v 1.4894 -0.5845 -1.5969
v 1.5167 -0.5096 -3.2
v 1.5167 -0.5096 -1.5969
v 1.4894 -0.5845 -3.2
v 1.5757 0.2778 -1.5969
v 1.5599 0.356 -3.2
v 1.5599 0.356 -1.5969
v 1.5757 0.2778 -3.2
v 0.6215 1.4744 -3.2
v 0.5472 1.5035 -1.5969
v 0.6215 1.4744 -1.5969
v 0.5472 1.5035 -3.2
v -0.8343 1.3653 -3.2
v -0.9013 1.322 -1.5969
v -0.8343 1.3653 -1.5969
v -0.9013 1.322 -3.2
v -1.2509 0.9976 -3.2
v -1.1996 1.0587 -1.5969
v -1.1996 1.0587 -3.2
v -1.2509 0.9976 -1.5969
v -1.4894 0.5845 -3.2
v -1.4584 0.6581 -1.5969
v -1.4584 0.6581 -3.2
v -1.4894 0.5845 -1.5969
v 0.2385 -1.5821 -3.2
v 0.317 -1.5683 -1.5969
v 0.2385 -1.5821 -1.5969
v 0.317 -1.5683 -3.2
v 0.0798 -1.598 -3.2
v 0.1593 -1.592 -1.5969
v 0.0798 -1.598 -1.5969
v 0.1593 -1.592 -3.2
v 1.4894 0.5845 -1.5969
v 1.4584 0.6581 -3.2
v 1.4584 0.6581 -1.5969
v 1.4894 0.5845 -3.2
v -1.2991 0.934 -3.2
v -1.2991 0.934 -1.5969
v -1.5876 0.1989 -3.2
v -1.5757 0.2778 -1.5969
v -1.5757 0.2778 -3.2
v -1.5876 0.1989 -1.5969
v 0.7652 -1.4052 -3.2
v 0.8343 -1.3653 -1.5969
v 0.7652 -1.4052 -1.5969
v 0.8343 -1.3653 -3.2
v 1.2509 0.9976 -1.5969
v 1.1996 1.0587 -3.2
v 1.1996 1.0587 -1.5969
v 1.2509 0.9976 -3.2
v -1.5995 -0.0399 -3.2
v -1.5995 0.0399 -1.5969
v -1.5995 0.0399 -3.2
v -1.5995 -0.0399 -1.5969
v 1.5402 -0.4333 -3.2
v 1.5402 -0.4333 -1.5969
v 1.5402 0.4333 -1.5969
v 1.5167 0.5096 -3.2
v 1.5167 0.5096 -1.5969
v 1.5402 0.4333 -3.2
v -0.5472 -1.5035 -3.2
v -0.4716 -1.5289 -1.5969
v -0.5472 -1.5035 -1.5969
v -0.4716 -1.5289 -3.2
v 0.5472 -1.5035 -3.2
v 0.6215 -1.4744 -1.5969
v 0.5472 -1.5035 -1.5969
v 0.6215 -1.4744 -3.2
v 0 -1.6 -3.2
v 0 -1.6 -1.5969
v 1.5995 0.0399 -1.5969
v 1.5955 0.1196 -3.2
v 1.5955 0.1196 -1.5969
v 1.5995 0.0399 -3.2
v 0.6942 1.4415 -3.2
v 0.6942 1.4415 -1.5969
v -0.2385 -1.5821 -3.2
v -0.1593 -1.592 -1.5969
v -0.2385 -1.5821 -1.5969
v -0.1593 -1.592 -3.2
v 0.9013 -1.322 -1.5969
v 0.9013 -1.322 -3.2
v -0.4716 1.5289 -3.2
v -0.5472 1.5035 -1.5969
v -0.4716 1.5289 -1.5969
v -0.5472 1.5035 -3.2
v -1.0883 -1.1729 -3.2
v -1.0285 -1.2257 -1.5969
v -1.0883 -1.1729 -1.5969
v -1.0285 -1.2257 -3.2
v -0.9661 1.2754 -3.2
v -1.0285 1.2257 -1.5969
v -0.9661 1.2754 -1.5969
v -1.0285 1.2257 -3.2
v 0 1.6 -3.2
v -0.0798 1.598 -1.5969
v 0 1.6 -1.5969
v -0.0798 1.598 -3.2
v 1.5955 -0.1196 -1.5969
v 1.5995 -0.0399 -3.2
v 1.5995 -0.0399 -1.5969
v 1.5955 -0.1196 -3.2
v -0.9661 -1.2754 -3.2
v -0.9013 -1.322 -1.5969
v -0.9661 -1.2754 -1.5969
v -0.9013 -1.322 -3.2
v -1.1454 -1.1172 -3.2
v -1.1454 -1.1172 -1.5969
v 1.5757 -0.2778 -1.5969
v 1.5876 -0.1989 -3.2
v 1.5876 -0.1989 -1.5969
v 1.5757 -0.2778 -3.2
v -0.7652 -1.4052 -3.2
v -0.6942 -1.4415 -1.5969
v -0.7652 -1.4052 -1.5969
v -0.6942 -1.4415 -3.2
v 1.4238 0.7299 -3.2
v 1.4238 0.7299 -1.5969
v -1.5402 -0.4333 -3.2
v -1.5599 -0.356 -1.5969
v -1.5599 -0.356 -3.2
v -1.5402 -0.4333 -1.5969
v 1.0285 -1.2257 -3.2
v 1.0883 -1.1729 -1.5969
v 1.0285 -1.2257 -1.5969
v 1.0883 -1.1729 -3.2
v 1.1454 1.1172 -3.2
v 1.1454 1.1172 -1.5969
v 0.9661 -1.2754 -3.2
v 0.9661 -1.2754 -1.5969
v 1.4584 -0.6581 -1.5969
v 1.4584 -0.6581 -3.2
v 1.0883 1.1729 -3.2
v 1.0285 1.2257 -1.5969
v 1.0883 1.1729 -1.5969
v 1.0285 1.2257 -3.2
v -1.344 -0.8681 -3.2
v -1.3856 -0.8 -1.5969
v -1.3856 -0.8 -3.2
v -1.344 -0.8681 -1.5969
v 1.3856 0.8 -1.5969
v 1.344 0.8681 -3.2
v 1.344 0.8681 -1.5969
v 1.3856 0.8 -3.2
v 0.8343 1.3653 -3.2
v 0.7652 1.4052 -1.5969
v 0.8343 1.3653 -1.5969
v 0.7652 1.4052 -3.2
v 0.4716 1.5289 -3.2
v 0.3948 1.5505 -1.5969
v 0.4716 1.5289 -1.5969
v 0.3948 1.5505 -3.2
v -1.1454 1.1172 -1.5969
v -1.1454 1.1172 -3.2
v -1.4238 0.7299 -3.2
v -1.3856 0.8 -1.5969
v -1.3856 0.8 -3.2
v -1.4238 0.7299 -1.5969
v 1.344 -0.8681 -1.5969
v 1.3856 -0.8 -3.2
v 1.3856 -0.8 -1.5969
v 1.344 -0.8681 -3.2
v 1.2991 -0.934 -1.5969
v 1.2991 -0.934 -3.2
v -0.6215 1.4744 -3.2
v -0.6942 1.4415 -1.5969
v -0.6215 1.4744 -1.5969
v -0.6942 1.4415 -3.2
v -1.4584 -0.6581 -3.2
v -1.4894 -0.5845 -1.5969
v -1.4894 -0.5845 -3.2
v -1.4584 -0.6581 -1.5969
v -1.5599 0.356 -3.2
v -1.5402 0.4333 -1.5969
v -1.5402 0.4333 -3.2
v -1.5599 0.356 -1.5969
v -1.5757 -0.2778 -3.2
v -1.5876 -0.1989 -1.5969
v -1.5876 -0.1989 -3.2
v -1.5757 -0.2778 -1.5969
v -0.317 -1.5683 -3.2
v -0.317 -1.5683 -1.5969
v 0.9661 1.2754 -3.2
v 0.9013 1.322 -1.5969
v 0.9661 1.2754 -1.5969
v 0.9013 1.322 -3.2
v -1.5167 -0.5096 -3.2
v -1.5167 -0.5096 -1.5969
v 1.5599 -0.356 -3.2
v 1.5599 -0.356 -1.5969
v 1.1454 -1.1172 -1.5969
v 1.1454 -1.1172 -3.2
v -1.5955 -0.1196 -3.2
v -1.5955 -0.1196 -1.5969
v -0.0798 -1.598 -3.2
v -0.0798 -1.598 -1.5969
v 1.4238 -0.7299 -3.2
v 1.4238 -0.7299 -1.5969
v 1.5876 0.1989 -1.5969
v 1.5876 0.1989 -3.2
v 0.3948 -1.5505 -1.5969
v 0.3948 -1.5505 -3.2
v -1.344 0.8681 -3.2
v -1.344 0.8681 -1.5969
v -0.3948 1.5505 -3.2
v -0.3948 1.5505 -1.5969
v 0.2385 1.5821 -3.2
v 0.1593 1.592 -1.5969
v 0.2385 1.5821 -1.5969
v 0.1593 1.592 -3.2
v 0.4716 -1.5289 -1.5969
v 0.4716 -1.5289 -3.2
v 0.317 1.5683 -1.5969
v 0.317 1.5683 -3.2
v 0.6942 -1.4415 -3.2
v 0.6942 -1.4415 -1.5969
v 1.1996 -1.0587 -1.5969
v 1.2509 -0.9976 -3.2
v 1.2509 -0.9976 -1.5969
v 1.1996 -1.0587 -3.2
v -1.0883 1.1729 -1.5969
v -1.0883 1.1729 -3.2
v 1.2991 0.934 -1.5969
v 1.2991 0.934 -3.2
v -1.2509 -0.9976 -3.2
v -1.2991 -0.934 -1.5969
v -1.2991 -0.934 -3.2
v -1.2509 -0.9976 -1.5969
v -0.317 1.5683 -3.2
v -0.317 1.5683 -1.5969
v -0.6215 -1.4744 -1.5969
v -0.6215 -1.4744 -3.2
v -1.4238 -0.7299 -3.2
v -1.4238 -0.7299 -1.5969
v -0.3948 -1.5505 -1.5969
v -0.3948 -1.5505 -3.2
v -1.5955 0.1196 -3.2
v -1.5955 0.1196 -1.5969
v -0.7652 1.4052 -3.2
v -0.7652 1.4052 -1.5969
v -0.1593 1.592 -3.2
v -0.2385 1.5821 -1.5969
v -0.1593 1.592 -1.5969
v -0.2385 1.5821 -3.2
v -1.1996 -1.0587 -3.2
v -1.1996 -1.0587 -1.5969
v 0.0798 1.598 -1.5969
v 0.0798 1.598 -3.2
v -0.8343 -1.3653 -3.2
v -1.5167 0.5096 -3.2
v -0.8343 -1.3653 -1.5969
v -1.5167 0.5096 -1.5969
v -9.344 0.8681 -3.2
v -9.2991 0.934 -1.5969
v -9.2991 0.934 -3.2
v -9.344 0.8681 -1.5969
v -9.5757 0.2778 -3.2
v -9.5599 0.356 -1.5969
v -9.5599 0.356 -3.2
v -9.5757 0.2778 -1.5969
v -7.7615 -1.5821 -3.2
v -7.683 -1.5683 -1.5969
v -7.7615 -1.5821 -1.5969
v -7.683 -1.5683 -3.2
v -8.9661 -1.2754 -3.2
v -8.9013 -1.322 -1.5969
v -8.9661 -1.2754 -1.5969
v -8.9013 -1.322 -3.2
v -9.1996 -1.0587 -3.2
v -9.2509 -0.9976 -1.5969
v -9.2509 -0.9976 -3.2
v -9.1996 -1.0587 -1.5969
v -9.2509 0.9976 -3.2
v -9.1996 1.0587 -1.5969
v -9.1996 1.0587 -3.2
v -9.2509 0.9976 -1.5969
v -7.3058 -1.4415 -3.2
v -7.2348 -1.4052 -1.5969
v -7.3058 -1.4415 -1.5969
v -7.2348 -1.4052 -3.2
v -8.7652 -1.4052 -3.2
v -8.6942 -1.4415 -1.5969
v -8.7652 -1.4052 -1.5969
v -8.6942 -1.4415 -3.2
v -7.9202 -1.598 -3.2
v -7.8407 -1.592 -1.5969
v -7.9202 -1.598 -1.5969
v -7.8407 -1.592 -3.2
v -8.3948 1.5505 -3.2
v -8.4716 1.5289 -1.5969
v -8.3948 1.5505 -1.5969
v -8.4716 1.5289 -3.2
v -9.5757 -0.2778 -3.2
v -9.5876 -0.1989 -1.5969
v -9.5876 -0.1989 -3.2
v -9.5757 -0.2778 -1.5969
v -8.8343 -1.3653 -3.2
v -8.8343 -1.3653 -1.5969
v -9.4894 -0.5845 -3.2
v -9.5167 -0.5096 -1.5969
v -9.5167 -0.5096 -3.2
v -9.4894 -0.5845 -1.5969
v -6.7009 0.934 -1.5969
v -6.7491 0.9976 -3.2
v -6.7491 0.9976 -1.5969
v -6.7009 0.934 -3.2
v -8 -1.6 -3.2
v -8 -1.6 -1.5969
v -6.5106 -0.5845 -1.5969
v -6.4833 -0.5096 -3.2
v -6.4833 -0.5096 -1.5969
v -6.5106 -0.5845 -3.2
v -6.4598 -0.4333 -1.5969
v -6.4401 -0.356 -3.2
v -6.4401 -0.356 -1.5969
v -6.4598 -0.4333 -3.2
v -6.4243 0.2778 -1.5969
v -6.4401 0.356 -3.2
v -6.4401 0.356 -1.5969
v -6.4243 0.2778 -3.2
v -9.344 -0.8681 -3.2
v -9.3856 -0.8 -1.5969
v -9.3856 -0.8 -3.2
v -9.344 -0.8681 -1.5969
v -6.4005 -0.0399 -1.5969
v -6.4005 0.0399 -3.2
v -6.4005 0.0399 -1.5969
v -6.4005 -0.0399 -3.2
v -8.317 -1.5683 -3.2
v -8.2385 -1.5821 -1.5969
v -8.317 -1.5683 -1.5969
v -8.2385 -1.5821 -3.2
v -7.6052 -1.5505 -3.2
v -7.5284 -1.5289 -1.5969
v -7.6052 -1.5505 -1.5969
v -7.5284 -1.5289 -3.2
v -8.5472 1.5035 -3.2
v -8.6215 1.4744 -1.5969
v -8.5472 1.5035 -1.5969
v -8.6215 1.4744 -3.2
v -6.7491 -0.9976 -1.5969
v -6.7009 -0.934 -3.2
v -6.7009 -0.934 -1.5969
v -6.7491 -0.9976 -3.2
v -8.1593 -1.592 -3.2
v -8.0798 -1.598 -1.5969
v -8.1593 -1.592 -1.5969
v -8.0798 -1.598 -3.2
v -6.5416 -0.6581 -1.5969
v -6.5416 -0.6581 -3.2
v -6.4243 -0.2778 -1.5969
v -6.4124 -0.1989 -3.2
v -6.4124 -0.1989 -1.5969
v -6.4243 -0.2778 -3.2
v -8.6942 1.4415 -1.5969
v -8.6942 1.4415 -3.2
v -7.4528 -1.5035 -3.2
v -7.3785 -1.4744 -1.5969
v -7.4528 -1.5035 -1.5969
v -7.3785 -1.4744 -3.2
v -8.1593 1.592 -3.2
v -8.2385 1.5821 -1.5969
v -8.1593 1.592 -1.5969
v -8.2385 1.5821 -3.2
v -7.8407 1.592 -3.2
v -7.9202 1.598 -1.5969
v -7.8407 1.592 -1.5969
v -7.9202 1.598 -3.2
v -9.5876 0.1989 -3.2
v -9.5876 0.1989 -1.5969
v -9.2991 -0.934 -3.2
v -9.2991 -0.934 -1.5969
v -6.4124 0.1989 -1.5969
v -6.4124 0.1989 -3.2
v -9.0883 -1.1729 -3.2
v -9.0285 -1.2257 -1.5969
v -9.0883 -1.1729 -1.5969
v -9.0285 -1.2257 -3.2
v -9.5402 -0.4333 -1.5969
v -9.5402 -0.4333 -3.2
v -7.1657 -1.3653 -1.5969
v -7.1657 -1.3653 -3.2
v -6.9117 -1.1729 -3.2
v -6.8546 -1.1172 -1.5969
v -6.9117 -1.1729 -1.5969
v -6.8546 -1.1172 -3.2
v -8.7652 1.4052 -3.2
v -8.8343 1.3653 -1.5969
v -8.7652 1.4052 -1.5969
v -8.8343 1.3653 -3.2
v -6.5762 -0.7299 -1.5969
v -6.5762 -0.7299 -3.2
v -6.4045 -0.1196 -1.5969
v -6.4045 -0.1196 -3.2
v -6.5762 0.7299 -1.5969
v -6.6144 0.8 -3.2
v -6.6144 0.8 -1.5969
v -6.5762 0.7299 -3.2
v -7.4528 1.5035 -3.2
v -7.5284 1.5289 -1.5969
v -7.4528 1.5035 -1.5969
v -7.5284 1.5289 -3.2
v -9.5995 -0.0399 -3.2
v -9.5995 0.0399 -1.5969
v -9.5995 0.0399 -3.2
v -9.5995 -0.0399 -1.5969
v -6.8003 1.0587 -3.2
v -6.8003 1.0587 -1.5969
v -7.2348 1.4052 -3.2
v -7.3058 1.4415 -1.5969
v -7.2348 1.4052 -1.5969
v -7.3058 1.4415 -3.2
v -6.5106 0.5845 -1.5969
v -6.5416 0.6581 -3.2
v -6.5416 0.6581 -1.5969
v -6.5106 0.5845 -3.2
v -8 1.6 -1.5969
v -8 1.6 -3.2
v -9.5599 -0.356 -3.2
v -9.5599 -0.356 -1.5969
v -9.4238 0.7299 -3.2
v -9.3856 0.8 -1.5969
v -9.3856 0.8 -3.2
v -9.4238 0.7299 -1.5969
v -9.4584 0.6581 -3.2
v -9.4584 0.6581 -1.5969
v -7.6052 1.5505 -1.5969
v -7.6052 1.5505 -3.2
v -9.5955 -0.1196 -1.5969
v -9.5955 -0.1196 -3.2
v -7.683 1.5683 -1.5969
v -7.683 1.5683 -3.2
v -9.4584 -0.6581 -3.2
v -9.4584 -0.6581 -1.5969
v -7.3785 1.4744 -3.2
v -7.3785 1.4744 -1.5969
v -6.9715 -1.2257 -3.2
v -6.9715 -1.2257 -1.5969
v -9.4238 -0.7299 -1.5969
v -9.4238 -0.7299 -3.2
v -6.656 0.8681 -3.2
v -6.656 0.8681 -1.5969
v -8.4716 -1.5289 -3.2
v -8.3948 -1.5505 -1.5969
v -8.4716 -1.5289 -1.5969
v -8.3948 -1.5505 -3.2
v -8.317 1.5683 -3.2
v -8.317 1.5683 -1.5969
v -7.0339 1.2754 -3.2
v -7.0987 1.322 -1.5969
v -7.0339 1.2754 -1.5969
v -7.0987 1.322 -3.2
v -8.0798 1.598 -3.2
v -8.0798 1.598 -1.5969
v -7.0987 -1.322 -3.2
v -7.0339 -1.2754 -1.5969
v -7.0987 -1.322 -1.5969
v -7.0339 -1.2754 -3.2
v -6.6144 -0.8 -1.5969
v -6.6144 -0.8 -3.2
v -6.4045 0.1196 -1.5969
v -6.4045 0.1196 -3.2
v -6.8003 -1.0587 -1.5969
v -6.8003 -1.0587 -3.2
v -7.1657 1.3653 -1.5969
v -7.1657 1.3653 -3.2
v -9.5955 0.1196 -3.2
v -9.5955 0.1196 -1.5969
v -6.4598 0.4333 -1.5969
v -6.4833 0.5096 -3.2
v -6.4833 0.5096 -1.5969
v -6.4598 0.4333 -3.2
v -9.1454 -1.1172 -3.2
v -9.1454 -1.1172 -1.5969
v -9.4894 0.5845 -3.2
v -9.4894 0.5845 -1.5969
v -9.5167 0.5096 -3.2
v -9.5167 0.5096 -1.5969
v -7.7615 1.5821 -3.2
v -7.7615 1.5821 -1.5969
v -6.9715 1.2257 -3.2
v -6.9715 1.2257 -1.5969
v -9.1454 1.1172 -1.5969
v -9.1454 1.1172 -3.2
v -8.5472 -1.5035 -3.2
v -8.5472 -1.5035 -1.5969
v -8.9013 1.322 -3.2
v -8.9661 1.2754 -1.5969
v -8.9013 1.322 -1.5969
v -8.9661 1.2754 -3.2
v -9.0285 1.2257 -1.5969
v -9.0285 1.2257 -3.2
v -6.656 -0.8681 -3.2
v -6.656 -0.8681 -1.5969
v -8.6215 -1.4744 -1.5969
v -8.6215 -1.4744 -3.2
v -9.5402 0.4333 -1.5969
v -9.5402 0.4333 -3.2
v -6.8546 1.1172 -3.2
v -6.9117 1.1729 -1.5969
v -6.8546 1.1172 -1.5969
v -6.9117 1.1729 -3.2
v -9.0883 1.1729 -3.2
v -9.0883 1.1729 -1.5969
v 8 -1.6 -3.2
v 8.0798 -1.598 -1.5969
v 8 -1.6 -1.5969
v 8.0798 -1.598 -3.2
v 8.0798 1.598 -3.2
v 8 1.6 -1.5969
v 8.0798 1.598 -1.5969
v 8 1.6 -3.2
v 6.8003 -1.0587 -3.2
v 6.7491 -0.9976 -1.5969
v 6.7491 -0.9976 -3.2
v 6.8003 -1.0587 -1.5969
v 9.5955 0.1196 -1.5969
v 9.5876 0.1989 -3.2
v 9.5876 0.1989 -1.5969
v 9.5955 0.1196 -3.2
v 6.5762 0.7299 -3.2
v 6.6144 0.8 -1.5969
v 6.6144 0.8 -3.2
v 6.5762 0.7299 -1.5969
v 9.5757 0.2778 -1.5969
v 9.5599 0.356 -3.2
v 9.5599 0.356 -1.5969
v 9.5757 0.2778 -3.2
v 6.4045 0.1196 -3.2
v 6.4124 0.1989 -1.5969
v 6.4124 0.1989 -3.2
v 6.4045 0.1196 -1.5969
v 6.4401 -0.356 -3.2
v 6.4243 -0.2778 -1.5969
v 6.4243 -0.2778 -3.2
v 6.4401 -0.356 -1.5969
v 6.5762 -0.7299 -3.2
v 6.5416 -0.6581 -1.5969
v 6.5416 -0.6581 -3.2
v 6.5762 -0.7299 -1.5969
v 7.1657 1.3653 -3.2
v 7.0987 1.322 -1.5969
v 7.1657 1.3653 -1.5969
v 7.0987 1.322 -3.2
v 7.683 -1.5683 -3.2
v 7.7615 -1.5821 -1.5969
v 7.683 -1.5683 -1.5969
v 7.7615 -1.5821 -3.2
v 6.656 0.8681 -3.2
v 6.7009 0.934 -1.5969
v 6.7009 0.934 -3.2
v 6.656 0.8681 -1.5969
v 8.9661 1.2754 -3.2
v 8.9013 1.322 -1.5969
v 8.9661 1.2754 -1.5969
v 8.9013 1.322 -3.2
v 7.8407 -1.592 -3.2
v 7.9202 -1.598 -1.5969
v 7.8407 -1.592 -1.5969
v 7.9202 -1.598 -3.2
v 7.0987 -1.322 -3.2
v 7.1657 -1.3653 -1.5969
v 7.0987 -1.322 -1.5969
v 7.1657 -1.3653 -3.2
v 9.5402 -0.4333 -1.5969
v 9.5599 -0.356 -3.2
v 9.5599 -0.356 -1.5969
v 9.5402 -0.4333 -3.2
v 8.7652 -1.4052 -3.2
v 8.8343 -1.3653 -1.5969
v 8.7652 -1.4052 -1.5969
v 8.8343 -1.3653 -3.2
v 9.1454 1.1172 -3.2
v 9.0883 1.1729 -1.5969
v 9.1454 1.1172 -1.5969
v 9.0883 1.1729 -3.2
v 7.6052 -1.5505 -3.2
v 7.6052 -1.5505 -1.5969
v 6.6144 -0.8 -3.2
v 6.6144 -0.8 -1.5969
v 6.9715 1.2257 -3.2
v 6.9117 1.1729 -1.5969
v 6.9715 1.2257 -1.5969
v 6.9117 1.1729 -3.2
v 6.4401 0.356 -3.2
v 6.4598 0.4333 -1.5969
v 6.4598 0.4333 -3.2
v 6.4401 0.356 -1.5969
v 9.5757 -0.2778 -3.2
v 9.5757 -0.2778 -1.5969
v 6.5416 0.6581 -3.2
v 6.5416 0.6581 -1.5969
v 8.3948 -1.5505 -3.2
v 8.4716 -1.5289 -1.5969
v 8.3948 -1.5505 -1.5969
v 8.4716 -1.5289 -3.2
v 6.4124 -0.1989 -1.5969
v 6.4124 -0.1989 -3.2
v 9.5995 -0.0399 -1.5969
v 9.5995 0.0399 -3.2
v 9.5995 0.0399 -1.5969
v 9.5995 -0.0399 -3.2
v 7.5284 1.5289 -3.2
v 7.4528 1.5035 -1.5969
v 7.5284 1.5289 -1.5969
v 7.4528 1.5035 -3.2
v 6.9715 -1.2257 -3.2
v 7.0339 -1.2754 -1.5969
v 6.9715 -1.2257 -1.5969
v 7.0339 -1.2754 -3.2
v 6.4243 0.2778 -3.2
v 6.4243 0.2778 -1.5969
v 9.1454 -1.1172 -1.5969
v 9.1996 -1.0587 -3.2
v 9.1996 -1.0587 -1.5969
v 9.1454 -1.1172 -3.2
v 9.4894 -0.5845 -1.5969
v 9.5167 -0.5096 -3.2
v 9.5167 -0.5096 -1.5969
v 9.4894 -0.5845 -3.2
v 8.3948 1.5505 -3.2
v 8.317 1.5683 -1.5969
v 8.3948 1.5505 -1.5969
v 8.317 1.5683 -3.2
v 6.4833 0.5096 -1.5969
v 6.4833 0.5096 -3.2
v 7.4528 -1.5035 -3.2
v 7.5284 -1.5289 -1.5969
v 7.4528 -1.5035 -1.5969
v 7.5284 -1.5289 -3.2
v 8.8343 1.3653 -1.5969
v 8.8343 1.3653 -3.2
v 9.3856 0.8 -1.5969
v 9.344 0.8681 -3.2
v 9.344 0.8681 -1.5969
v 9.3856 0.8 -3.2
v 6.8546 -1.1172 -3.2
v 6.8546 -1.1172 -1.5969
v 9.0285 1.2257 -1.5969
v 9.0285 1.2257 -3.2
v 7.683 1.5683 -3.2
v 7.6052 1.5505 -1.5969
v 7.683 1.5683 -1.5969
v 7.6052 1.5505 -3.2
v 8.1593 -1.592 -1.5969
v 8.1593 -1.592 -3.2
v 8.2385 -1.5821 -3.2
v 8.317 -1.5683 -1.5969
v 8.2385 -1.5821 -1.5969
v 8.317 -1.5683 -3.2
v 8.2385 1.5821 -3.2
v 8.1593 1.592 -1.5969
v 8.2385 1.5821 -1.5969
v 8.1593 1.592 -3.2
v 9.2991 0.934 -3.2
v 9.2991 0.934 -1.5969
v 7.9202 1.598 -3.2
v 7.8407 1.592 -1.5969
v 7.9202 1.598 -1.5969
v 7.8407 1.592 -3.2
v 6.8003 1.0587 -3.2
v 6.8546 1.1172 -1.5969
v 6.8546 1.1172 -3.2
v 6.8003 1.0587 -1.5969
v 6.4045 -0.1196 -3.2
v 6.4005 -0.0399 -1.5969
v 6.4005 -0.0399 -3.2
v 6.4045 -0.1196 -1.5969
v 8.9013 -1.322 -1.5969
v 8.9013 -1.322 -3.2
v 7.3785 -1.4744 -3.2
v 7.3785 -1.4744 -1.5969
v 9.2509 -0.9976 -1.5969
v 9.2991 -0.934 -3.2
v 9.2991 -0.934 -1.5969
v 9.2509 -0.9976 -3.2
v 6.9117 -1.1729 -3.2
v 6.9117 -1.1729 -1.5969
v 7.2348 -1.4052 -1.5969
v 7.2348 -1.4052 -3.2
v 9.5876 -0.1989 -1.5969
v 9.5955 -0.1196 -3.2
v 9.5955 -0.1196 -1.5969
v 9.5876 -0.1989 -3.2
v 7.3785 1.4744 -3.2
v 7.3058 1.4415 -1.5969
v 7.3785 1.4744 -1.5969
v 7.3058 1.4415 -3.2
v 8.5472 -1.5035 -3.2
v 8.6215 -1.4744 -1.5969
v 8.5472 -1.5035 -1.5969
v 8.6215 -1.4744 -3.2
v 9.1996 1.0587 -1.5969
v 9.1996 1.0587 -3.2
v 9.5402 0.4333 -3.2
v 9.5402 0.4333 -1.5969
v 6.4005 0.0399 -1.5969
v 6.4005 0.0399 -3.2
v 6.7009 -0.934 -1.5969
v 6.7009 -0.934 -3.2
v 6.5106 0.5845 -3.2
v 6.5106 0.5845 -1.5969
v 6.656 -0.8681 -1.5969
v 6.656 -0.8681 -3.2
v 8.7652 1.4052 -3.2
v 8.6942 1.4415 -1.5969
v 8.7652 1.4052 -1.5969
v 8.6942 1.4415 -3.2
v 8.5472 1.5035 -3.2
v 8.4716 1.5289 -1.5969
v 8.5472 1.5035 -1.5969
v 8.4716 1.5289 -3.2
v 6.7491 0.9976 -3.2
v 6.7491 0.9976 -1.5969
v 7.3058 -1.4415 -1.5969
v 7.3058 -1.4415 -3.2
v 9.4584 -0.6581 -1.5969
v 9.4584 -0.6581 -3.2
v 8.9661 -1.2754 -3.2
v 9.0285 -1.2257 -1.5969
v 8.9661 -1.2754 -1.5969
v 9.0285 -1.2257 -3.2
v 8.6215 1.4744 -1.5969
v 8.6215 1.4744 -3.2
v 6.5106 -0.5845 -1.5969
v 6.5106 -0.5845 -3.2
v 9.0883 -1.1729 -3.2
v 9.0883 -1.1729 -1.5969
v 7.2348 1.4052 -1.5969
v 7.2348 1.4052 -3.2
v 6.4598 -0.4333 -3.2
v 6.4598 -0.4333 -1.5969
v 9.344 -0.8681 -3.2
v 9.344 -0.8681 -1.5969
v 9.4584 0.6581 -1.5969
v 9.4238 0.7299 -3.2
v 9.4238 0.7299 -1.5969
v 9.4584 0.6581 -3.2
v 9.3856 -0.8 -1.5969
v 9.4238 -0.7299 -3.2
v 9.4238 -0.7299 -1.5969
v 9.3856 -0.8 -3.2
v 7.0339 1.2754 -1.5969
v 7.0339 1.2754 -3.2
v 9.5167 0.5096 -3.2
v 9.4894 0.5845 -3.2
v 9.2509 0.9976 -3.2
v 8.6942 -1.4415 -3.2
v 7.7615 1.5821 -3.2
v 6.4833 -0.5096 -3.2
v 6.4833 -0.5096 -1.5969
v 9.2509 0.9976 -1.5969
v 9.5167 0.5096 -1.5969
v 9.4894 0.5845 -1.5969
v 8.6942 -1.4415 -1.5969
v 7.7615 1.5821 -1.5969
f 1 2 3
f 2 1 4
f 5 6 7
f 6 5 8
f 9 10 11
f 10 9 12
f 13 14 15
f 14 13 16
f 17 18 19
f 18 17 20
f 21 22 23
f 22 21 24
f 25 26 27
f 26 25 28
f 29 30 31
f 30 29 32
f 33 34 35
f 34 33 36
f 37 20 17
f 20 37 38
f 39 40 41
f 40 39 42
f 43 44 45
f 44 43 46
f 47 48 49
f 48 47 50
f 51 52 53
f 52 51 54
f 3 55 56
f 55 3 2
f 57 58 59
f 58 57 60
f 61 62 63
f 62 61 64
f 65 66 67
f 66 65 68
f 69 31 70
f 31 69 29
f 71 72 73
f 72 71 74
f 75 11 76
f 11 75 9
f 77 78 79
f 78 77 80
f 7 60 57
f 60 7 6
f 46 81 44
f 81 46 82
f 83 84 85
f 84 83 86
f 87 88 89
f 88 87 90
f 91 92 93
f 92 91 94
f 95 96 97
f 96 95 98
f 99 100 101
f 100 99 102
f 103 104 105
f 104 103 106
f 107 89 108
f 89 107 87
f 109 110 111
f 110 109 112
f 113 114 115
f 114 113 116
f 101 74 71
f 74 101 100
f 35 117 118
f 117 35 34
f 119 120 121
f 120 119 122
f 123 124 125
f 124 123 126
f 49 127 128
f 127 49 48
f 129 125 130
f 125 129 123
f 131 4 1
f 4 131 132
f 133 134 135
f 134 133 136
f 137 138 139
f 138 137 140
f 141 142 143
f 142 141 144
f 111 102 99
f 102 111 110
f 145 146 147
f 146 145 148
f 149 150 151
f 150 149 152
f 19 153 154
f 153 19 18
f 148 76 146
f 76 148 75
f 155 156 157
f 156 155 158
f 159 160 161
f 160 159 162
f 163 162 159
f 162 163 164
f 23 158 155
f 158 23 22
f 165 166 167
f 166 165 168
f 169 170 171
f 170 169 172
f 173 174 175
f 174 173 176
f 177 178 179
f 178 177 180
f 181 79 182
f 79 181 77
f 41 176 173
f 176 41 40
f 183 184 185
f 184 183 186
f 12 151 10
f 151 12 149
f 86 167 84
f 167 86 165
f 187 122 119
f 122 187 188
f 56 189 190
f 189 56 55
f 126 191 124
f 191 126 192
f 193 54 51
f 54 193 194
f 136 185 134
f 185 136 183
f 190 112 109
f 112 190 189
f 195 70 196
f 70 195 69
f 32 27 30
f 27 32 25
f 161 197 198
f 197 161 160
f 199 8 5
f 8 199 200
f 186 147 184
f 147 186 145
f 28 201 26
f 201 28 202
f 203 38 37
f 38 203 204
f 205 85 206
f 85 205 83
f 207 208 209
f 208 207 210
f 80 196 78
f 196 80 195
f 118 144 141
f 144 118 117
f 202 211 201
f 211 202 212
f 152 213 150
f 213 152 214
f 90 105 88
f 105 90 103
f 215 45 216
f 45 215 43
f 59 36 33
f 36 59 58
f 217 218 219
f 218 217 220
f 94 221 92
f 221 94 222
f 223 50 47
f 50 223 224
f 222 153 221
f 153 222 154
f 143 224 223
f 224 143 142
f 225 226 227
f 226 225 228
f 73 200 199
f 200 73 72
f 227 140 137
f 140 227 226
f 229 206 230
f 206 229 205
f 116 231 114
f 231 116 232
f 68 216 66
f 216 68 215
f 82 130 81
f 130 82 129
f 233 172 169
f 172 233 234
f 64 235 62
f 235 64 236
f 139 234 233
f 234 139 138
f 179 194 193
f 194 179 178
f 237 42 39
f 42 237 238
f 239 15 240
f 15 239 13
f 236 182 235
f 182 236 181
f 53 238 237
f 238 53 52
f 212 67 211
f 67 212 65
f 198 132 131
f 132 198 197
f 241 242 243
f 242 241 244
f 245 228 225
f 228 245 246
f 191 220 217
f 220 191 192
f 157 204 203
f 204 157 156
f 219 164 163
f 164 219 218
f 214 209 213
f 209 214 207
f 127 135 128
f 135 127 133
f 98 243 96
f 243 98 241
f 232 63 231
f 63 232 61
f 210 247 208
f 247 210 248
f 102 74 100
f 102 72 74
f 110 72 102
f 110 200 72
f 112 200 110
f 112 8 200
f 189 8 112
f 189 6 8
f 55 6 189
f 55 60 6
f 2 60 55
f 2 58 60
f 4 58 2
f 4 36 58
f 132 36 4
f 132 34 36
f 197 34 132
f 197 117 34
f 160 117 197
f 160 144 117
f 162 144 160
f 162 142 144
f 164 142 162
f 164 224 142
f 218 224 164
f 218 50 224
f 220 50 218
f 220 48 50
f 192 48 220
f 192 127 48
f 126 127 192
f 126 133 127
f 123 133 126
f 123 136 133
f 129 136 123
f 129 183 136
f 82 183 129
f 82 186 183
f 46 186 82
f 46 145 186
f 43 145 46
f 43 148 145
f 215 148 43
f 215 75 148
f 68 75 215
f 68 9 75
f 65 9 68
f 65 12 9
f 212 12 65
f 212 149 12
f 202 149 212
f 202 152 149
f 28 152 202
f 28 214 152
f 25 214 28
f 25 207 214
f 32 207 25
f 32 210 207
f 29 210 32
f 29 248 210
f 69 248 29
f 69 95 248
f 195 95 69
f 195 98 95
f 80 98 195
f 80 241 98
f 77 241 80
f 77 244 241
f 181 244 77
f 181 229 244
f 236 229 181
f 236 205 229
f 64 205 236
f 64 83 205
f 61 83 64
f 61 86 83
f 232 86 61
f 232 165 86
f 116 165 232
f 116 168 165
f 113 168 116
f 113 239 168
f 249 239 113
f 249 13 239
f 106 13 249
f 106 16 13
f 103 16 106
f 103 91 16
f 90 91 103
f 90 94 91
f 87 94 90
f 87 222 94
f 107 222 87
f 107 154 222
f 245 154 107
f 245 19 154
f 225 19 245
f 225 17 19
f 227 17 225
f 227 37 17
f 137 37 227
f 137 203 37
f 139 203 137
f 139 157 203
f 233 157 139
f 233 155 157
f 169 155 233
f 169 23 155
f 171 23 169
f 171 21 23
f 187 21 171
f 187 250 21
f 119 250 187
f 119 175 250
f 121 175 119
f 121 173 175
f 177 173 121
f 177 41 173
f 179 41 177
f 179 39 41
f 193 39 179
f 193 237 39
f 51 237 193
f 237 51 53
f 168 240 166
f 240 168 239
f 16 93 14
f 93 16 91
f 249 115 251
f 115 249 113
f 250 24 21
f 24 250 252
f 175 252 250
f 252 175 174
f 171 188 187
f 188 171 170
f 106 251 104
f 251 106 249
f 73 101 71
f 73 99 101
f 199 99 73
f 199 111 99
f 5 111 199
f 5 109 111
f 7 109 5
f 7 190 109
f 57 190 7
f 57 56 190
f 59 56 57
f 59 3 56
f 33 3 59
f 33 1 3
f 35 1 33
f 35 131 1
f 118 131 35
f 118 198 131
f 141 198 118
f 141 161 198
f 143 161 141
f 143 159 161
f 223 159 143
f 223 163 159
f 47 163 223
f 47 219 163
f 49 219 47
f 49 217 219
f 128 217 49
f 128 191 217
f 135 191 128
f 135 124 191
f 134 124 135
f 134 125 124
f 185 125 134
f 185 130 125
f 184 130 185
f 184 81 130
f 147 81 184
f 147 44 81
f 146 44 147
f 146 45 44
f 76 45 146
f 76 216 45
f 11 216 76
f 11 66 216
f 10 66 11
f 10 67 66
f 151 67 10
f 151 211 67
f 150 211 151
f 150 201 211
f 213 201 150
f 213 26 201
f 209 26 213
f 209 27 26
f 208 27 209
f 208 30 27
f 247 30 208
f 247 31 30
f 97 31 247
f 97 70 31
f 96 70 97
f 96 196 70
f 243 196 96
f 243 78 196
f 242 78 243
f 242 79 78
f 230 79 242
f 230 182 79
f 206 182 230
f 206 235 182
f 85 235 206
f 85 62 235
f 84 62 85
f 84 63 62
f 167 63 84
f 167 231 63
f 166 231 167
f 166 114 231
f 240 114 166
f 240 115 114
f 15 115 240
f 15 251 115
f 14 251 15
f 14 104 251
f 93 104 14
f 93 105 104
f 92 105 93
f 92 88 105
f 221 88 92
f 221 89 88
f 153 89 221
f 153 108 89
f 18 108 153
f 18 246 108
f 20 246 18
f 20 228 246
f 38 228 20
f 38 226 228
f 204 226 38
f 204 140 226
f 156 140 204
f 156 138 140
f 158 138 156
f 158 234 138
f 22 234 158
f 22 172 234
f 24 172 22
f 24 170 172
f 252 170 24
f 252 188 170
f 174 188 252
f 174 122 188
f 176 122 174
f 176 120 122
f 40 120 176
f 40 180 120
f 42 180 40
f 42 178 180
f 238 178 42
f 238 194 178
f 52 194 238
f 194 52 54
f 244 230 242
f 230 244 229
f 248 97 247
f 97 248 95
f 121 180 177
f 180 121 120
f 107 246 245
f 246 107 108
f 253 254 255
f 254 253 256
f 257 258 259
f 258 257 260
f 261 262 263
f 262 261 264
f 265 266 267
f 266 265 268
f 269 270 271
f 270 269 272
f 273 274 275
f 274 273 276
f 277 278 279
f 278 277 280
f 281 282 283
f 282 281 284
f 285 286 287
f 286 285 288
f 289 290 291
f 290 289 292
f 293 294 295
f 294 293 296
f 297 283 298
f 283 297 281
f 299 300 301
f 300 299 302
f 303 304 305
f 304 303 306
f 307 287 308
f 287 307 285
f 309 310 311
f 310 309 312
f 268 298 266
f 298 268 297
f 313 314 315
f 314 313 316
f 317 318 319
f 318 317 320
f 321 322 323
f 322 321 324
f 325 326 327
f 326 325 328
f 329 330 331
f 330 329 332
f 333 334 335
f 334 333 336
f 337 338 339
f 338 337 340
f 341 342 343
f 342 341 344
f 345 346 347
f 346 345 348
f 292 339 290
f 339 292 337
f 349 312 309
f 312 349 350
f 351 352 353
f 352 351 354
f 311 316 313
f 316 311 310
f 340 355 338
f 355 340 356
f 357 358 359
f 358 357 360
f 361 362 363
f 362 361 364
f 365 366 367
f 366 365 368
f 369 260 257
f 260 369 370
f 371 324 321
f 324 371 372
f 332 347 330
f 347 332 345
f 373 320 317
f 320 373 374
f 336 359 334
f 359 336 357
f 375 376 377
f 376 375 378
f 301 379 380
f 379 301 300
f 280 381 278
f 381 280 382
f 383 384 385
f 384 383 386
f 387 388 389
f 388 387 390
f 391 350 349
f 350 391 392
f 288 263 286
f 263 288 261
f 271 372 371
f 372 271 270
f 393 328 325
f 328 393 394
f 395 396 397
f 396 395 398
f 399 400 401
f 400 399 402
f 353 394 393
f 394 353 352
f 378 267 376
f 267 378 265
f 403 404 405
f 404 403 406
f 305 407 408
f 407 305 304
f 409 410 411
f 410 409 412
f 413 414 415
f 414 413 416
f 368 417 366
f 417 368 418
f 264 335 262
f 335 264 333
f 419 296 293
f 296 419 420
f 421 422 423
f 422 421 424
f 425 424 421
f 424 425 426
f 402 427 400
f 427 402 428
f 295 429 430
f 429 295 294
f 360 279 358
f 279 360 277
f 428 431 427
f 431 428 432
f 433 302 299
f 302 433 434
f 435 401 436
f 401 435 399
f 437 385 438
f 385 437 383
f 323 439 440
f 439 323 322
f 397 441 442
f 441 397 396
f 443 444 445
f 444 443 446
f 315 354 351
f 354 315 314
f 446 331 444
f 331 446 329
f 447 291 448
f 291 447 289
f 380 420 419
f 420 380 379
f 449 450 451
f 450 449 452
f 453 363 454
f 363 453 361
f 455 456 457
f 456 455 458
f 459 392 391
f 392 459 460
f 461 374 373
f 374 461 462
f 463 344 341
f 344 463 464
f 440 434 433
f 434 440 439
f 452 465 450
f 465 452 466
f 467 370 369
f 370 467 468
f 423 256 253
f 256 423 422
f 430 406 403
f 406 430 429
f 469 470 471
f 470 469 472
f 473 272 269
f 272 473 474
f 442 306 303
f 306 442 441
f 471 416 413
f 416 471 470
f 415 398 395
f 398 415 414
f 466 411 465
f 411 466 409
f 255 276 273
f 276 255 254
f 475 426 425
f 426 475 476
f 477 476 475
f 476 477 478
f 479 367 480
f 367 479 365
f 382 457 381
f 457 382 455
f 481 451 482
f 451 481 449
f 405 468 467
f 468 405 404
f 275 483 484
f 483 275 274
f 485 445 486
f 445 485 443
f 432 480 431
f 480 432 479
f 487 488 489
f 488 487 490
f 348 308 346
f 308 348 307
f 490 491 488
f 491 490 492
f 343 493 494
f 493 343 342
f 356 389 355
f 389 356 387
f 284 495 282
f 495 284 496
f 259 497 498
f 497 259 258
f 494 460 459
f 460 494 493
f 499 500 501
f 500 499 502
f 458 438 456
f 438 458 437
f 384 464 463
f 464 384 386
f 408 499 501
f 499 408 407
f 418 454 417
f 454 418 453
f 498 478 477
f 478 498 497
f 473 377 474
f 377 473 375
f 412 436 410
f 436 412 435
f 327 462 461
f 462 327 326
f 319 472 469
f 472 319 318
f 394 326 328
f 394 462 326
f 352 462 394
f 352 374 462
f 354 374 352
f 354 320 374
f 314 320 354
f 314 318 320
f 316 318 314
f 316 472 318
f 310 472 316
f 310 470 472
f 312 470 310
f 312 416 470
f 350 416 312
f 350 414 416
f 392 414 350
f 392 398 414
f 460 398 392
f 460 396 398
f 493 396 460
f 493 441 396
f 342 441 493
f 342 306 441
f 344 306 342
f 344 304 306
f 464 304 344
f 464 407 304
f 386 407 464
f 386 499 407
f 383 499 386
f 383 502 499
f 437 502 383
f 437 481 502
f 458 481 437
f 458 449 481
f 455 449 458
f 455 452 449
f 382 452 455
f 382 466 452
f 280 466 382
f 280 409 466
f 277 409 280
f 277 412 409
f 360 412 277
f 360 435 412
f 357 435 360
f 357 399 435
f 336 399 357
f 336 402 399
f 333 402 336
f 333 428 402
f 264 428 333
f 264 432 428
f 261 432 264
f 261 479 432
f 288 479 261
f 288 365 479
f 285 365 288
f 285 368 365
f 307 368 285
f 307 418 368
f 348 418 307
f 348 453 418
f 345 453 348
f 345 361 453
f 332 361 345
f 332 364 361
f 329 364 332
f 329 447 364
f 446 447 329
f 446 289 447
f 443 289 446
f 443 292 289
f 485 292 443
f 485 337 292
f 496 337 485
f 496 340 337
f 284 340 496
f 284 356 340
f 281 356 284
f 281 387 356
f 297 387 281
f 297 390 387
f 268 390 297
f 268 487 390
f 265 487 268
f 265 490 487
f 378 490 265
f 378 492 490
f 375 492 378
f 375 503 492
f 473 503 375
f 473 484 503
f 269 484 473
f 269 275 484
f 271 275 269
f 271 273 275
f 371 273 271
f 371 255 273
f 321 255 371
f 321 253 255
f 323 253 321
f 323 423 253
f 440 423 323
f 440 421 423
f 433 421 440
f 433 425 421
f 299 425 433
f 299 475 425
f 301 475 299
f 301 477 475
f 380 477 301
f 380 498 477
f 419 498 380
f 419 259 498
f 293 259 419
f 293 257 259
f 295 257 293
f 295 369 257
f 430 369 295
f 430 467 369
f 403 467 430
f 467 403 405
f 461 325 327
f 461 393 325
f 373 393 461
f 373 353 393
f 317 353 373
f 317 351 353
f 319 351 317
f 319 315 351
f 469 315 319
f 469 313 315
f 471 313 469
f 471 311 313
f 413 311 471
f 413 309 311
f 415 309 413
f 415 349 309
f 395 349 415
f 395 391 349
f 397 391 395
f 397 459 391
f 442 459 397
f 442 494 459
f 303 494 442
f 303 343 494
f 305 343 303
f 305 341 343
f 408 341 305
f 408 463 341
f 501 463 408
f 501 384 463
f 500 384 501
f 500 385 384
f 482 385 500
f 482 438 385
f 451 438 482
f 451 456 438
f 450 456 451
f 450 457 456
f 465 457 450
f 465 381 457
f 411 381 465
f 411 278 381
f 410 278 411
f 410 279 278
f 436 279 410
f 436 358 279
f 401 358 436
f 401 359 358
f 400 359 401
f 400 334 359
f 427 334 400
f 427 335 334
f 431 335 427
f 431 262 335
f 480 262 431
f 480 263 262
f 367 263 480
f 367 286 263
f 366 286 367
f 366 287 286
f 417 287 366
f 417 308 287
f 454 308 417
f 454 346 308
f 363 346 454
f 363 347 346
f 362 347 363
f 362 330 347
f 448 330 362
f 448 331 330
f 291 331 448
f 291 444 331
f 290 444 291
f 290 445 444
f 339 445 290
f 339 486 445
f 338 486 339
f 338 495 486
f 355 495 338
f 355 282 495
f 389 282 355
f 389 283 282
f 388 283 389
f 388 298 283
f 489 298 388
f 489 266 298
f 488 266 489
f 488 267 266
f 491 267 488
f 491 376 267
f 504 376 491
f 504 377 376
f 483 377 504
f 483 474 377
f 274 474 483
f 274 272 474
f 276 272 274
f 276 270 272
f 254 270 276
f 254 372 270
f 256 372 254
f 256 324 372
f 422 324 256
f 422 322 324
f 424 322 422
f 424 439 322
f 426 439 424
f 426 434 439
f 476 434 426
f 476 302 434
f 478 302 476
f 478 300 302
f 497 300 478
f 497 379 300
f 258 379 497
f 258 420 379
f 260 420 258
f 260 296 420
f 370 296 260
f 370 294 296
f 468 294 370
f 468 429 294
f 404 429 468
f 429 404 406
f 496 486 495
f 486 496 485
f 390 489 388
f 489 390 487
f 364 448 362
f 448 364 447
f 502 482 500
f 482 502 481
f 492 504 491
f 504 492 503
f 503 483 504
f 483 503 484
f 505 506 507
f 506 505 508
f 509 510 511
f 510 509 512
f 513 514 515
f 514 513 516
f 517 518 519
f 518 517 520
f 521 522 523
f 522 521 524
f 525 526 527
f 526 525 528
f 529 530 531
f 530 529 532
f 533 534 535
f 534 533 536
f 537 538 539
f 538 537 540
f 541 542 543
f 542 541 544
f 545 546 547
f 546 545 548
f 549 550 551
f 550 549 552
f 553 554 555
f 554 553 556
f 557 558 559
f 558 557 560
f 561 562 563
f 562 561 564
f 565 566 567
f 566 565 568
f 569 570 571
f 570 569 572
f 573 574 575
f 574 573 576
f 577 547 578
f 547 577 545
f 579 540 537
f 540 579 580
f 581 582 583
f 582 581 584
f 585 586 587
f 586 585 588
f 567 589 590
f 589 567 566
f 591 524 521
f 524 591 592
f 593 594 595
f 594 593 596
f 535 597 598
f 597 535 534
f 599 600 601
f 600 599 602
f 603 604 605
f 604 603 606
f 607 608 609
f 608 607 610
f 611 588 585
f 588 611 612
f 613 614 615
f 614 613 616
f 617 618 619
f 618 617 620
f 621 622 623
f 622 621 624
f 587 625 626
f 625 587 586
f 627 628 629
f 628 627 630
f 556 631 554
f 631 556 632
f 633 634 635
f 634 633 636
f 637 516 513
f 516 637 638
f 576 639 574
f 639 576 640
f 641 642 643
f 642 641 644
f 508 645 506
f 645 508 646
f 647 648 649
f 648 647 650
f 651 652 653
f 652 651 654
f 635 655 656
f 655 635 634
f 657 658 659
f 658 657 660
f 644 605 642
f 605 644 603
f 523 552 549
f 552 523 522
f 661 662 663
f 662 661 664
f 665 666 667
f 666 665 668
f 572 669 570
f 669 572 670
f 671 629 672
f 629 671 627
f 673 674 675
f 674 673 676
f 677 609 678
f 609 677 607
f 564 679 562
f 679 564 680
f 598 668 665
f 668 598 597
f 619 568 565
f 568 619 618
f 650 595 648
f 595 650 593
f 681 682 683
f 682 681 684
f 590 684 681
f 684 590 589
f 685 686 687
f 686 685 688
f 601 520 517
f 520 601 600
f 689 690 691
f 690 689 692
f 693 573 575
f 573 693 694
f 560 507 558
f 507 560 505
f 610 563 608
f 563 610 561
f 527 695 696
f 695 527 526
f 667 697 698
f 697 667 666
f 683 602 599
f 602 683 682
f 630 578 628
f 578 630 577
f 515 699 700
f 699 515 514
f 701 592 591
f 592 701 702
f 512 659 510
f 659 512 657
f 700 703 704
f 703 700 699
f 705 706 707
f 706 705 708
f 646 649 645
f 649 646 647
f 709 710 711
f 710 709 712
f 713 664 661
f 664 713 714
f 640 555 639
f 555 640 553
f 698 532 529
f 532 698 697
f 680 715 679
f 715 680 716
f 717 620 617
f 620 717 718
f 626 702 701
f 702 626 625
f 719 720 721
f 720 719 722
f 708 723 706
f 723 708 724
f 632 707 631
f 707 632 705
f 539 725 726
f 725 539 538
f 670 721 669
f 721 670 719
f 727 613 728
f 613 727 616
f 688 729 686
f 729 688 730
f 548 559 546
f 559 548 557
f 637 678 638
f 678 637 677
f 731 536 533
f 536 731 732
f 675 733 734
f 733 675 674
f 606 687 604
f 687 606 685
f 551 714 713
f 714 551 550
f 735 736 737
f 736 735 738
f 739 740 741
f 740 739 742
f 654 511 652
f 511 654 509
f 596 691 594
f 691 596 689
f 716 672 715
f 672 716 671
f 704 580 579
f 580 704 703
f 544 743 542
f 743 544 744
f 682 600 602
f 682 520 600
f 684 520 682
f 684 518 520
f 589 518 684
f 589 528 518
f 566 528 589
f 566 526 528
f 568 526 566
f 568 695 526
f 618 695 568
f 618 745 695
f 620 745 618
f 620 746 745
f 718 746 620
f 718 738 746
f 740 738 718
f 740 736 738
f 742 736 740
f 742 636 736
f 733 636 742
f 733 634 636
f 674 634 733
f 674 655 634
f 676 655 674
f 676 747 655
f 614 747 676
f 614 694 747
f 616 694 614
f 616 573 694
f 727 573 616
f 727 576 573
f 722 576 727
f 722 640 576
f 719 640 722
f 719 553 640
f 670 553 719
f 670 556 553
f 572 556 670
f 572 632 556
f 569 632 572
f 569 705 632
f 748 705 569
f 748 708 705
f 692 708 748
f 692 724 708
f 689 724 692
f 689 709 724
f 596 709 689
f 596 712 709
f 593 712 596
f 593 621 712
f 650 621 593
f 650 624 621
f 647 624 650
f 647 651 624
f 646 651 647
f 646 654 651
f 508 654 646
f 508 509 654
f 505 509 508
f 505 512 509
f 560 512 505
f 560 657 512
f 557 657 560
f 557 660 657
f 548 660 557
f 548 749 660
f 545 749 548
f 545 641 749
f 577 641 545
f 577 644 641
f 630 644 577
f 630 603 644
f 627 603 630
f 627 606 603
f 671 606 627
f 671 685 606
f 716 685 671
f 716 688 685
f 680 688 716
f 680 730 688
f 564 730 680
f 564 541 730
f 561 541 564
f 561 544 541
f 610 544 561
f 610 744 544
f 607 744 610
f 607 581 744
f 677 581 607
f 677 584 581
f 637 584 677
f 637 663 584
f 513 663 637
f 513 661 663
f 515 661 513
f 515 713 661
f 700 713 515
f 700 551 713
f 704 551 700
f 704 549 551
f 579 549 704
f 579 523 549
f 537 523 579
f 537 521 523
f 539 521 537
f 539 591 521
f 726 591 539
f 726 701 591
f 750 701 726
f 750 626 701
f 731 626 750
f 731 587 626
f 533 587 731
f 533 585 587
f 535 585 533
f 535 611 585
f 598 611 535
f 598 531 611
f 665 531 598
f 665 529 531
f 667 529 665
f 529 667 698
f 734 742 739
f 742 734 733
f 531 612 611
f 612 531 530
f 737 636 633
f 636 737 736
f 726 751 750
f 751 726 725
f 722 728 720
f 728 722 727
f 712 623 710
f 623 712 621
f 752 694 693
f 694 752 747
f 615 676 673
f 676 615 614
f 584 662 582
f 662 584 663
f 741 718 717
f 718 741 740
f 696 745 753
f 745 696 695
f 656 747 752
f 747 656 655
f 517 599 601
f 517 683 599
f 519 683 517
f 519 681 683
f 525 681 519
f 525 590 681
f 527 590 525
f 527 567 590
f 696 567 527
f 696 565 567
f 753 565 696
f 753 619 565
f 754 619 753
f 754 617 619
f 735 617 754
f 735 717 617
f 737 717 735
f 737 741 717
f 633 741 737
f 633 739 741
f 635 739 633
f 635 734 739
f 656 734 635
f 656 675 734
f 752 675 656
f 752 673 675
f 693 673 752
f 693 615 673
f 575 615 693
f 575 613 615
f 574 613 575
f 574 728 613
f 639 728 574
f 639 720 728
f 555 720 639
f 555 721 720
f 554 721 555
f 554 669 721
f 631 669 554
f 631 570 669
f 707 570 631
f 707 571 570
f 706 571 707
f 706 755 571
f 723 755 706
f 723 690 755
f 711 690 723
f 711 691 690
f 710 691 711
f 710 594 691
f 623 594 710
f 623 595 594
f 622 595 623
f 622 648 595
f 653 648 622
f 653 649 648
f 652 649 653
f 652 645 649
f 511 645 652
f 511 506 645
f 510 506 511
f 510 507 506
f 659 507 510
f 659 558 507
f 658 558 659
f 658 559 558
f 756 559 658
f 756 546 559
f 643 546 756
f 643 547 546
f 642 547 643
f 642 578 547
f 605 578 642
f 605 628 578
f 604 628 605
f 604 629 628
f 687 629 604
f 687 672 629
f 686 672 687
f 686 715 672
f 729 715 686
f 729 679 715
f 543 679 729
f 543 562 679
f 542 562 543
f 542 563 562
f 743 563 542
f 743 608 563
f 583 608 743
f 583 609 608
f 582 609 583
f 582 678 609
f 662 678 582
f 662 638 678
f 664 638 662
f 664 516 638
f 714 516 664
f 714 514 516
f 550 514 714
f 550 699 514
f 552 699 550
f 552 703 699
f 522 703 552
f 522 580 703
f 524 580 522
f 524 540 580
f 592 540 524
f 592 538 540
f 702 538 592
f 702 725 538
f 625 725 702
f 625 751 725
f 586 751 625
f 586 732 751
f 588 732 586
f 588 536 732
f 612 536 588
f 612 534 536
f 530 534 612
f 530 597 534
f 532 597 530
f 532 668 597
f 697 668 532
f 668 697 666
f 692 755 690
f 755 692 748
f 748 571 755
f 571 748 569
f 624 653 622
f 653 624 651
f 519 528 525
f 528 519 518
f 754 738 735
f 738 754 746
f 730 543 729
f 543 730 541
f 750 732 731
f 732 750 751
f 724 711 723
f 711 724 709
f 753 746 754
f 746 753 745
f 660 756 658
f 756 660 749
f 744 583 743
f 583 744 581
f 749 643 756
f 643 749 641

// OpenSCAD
use <../lib.scad>
use <../p/4-4ndis.scad>
use <../p/4-4ring7.scad>
use <s/170876s1.scad>
use <s/170876s2.scad>
use <s/2431s01.scad>
$fa=1; $fs=0.2;
function ldraw_lib__2431pt1(realsolid=false) = [
// 0 Tile  1 x  4 with Octan Logos and "71" Pattern
// 0 Name: 2431pt1.dat
// 0 Author: Alex Taylor [anathema]
// 0 !LDRAW_ORG Part UPDATE 2010-01
// 0 !LICENSE Licensed under CC BY 2.0 and CC BY 4.0 : see CAreadme.txt
// 
// 0 BFC CERTIFY CCW
  [0,"BFC","CERTIFY"],
  [0,"BFC","CCW"],
// 
// 0 !HISTORY 2010-04-05 [PTadmin] Official Update 2010-01
// 
// 
// 1 16 0 0 0 1 0 0 0 1 0 0 0 1 s\2431s01.dat
  [1,16,0,0,0,1,0,0,0,1,0,0,0,1, ldraw_lib__s__2431s01(realsolid)],
// 1 4 24 0 -0.5 0.9 0 0 0 1 0 0 0 0.9 s\170876s1.dat
  [1,4,24,0,-0.5,0.9,0,0,0,1,0,0,0,0.9, ldraw_lib__s__170876s1(realsolid)],
// 1 15 24 0 -0.5 0.9 0 0 0 1 0 0 0 0.9 s\170876s2.dat
  [1,15,24,0,-0.5,0.9,0,0,0,1,0,0,0,0.9, ldraw_lib__s__170876s2(realsolid)],
// 1 2 25 0 0.5 -0.9 0 0 0 1 0 0 0 -0.9 s\170876s1.dat
  [1,2,25,0,0.5,-0.9,0,0,0,1,0,0,0,-0.9, ldraw_lib__s__170876s1(realsolid)],
// 1 15 25 0 0.5 -0.9 0 0 0 1 0 0 0 -0.9 s\170876s2.dat
  [1,15,25,0,0.5,-0.9,0,0,0,1,0,0,0,-0.9, ldraw_lib__s__170876s2(realsolid)],
// 1 15 24.5 0 0 1.55 0 0 0 1 0 0 0 1.05 4-4ring7.dat
  [1,15,24.5,0,0,1.55,0,0,0,1,0,0,0,1.05, ldraw_lib__4_4ring7(realsolid)],
// 1 16 24.5 0 0 12.4 0 0 0 1 0 0 0 8.4 4-4ndis.dat
  [1,16,24.5,0,0,12.4,0,0,0,1,0,0,0,8.4, ldraw_lib__4_4ndis(realsolid)],
// 1 4 -25 0 -0.5 0.9 0 0 0 1 0 0 0 0.9 s\170876s1.dat
  [1,4,-25,0,-0.5,0.9,0,0,0,1,0,0,0,0.9, ldraw_lib__s__170876s1(realsolid)],
// 1 15 -25 0 -0.5 0.9 0 0 0 1 0 0 0 0.9 s\170876s2.dat
  [1,15,-25,0,-0.5,0.9,0,0,0,1,0,0,0,0.9, ldraw_lib__s__170876s2(realsolid)],
// 1 2 -24 0 0.5 -0.9 0 0 0 1 0 0 0 -0.9 s\170876s1.dat
  [1,2,-24,0,0.5,-0.9,0,0,0,1,0,0,0,-0.9, ldraw_lib__s__170876s1(realsolid)],
// 1 15 -24 0 0.5 -0.9 0 0 0 1 0 0 0 -0.9 s\170876s2.dat
  [1,15,-24,0,0.5,-0.9,0,0,0,1,0,0,0,-0.9, ldraw_lib__s__170876s2(realsolid)],
// 1 15 -24.5 0 0 -1.55 0 0 0 1 0 0 0 1.05 4-4ring7.dat
  [1,15,-24.5,0,0,-1.55,0,0,0,1,0,0,0,1.05, ldraw_lib__4_4ring7(realsolid)],
// 1 16 -24.5 0 0 -12.4 0 0 0 1 0 0 0 8.4 4-4ndis.dat
  [1,16,-24.5,0,0,-12.4,0,0,0,1,0,0,0,8.4, ldraw_lib__4_4ndis(realsolid)],
// 4 0 2.8 0 -7.8 6.8 0 -7.8 9.3 0 7.9 5.3 0 7.9
  [4,0,2.8,0,-7.8,6.8,0,-7.8,9.3,0,7.9,5.3,0,7.9],
// 4 16 12.1 0 8.4 9.3 0 7.9 6.8 0 -7.8 12.1 0 -8.4
  [4,16,12.1,0,8.4,9.3,0,7.9,6.8,0,-7.8,12.1,0,-8.4],
// 4 16 5.3 0 7.9 2.8 0 7.9 -4.3 0 -7.8 2.8 0 -7.8
  [4,16,5.3,0,7.9,2.8,0,7.9,-4.3,0,-7.8,2.8,0,-7.8],
// 4 16 12.1 0 8.4 -12.1 0 8.4 2.8 0 7.9 5.3 0 7.9
  [4,16,12.1,0,8.4,-12.1,0,8.4,2.8,0,7.9,5.3,0,7.9],
// 4 0 -8.5 0 4.2 -2.873 0 4.2 2.8 0 7.9 -7.7 0 7.9
  [4,0,-8.5,0,4.2,-2.873,0,4.2,2.8,0,7.9,-7.7,0,7.9],
// 4 0 -8.3 0 -7.8 -4.3 0 -7.8 2.8 0 7.9 -2.873 0 4.2
  [4,0,-8.3,0,-7.8,-4.3,0,-7.8,2.8,0,7.9,-2.873,0,4.2],
// 4 16 -2.873 0 4.2 -8.5 0 4.2 -12.1 0 -8.4 -8.3 0 -7.8
  [4,16,-2.873,0,4.2,-8.5,0,4.2,-12.1,0,-8.4,-8.3,0,-7.8],
// 3 16 2.8 0 -7.8 12.1 0 -8.4 6.9 0 -7.8
  [3,16,2.8,0,-7.8,12.1,0,-8.4,6.9,0,-7.8],
// 3 16 -4.3 0 -7.8 12.1 0 -8.4 2.8 0 -7.8
  [3,16,-4.3,0,-7.8,12.1,0,-8.4,2.8,0,-7.8],
// 4 16 12.1 0 -8.4 -4.3 0 -7.8 -8.3 0 -7.8 -12.1 0 -8.4
  [4,16,12.1,0,-8.4,-4.3,0,-7.8,-8.3,0,-7.8,-12.1,0,-8.4],
// 4 16 12.1 0 -8.4 -12.1 0 -8.4 -40 0 -10 40 0 -10
  [4,16,12.1,0,-8.4,-12.1,0,-8.4,-40,0,-10,40,0,-10],
// 3 16 36.9 0 -8.4 12.1 0 -8.4 40 0 -10
  [3,16,36.9,0,-8.4,12.1,0,-8.4,40,0,-10],
// 3 16 40 0 -10 36.9 0 8.5 36.9 0 -8.4
  [3,16,40,0,-10,36.9,0,8.5,36.9,0,-8.4],
// 3 16 40 0 10 36.9 0 8.4 40 0 -10
  [3,16,40,0,10,36.9,0,8.4,40,0,-10],
// 3 16 12.1 0 8.4 36.9 0 8.4 40 0 10
  [3,16,12.1,0,8.4,36.9,0,8.4,40,0,10],
// 4 16 -12.1 0 8.4 12.1 0 8.4 40 0 10 -40 0 10
  [4,16,-12.1,0,8.4,12.1,0,8.4,40,0,10,-40,0,10],
// 3 16 -36.9 0 8.4 -12.1 0 8.4 -40 0 10
  [3,16,-36.9,0,8.4,-12.1,0,8.4,-40,0,10],
// 4 16 -36.9 0 -8.4 -36.9 0 8.4 -40 0 10 -40 0 -10
  [4,16,-36.9,0,-8.4,-36.9,0,8.4,-40,0,10,-40,0,-10],
// 3 16 -12.1 0 8.4 -7.7 0 7.9 2.8 0 7.9
  [3,16,-12.1,0,8.4,-7.7,0,7.9,2.8,0,7.9],
// 3 16 5.3 0 7.9 9.3 0 7.9 12.1 0 8.4
  [3,16,5.3,0,7.9,9.3,0,7.9,12.1,0,8.4],
// 4 16 -8.5 0 4.2 -7.7 0 7.9 -12.1 0 8.4 -12.1 0 -8.4
  [4,16,-8.5,0,4.2,-7.7,0,7.9,-12.1,0,8.4,-12.1,0,-8.4],
// 3 16 -12.1 0 -8.4 -36.9 0 -8.4 -40 0 -10
  [3,16,-12.1,0,-8.4,-36.9,0,-8.4,-40,0,-10],
// 0
];
module ldraw_lib__2431pt1(step=0, col=false, unit=2/5, alt=false, line=0.2, solid=!$preview)
    makepoly(ldraw_lib__2431pt1(solid), step=step, col=col, unit=unit, alt=alt, line=line, solid=solid);
ldraw_lib__2431pt1(line=0.2);
